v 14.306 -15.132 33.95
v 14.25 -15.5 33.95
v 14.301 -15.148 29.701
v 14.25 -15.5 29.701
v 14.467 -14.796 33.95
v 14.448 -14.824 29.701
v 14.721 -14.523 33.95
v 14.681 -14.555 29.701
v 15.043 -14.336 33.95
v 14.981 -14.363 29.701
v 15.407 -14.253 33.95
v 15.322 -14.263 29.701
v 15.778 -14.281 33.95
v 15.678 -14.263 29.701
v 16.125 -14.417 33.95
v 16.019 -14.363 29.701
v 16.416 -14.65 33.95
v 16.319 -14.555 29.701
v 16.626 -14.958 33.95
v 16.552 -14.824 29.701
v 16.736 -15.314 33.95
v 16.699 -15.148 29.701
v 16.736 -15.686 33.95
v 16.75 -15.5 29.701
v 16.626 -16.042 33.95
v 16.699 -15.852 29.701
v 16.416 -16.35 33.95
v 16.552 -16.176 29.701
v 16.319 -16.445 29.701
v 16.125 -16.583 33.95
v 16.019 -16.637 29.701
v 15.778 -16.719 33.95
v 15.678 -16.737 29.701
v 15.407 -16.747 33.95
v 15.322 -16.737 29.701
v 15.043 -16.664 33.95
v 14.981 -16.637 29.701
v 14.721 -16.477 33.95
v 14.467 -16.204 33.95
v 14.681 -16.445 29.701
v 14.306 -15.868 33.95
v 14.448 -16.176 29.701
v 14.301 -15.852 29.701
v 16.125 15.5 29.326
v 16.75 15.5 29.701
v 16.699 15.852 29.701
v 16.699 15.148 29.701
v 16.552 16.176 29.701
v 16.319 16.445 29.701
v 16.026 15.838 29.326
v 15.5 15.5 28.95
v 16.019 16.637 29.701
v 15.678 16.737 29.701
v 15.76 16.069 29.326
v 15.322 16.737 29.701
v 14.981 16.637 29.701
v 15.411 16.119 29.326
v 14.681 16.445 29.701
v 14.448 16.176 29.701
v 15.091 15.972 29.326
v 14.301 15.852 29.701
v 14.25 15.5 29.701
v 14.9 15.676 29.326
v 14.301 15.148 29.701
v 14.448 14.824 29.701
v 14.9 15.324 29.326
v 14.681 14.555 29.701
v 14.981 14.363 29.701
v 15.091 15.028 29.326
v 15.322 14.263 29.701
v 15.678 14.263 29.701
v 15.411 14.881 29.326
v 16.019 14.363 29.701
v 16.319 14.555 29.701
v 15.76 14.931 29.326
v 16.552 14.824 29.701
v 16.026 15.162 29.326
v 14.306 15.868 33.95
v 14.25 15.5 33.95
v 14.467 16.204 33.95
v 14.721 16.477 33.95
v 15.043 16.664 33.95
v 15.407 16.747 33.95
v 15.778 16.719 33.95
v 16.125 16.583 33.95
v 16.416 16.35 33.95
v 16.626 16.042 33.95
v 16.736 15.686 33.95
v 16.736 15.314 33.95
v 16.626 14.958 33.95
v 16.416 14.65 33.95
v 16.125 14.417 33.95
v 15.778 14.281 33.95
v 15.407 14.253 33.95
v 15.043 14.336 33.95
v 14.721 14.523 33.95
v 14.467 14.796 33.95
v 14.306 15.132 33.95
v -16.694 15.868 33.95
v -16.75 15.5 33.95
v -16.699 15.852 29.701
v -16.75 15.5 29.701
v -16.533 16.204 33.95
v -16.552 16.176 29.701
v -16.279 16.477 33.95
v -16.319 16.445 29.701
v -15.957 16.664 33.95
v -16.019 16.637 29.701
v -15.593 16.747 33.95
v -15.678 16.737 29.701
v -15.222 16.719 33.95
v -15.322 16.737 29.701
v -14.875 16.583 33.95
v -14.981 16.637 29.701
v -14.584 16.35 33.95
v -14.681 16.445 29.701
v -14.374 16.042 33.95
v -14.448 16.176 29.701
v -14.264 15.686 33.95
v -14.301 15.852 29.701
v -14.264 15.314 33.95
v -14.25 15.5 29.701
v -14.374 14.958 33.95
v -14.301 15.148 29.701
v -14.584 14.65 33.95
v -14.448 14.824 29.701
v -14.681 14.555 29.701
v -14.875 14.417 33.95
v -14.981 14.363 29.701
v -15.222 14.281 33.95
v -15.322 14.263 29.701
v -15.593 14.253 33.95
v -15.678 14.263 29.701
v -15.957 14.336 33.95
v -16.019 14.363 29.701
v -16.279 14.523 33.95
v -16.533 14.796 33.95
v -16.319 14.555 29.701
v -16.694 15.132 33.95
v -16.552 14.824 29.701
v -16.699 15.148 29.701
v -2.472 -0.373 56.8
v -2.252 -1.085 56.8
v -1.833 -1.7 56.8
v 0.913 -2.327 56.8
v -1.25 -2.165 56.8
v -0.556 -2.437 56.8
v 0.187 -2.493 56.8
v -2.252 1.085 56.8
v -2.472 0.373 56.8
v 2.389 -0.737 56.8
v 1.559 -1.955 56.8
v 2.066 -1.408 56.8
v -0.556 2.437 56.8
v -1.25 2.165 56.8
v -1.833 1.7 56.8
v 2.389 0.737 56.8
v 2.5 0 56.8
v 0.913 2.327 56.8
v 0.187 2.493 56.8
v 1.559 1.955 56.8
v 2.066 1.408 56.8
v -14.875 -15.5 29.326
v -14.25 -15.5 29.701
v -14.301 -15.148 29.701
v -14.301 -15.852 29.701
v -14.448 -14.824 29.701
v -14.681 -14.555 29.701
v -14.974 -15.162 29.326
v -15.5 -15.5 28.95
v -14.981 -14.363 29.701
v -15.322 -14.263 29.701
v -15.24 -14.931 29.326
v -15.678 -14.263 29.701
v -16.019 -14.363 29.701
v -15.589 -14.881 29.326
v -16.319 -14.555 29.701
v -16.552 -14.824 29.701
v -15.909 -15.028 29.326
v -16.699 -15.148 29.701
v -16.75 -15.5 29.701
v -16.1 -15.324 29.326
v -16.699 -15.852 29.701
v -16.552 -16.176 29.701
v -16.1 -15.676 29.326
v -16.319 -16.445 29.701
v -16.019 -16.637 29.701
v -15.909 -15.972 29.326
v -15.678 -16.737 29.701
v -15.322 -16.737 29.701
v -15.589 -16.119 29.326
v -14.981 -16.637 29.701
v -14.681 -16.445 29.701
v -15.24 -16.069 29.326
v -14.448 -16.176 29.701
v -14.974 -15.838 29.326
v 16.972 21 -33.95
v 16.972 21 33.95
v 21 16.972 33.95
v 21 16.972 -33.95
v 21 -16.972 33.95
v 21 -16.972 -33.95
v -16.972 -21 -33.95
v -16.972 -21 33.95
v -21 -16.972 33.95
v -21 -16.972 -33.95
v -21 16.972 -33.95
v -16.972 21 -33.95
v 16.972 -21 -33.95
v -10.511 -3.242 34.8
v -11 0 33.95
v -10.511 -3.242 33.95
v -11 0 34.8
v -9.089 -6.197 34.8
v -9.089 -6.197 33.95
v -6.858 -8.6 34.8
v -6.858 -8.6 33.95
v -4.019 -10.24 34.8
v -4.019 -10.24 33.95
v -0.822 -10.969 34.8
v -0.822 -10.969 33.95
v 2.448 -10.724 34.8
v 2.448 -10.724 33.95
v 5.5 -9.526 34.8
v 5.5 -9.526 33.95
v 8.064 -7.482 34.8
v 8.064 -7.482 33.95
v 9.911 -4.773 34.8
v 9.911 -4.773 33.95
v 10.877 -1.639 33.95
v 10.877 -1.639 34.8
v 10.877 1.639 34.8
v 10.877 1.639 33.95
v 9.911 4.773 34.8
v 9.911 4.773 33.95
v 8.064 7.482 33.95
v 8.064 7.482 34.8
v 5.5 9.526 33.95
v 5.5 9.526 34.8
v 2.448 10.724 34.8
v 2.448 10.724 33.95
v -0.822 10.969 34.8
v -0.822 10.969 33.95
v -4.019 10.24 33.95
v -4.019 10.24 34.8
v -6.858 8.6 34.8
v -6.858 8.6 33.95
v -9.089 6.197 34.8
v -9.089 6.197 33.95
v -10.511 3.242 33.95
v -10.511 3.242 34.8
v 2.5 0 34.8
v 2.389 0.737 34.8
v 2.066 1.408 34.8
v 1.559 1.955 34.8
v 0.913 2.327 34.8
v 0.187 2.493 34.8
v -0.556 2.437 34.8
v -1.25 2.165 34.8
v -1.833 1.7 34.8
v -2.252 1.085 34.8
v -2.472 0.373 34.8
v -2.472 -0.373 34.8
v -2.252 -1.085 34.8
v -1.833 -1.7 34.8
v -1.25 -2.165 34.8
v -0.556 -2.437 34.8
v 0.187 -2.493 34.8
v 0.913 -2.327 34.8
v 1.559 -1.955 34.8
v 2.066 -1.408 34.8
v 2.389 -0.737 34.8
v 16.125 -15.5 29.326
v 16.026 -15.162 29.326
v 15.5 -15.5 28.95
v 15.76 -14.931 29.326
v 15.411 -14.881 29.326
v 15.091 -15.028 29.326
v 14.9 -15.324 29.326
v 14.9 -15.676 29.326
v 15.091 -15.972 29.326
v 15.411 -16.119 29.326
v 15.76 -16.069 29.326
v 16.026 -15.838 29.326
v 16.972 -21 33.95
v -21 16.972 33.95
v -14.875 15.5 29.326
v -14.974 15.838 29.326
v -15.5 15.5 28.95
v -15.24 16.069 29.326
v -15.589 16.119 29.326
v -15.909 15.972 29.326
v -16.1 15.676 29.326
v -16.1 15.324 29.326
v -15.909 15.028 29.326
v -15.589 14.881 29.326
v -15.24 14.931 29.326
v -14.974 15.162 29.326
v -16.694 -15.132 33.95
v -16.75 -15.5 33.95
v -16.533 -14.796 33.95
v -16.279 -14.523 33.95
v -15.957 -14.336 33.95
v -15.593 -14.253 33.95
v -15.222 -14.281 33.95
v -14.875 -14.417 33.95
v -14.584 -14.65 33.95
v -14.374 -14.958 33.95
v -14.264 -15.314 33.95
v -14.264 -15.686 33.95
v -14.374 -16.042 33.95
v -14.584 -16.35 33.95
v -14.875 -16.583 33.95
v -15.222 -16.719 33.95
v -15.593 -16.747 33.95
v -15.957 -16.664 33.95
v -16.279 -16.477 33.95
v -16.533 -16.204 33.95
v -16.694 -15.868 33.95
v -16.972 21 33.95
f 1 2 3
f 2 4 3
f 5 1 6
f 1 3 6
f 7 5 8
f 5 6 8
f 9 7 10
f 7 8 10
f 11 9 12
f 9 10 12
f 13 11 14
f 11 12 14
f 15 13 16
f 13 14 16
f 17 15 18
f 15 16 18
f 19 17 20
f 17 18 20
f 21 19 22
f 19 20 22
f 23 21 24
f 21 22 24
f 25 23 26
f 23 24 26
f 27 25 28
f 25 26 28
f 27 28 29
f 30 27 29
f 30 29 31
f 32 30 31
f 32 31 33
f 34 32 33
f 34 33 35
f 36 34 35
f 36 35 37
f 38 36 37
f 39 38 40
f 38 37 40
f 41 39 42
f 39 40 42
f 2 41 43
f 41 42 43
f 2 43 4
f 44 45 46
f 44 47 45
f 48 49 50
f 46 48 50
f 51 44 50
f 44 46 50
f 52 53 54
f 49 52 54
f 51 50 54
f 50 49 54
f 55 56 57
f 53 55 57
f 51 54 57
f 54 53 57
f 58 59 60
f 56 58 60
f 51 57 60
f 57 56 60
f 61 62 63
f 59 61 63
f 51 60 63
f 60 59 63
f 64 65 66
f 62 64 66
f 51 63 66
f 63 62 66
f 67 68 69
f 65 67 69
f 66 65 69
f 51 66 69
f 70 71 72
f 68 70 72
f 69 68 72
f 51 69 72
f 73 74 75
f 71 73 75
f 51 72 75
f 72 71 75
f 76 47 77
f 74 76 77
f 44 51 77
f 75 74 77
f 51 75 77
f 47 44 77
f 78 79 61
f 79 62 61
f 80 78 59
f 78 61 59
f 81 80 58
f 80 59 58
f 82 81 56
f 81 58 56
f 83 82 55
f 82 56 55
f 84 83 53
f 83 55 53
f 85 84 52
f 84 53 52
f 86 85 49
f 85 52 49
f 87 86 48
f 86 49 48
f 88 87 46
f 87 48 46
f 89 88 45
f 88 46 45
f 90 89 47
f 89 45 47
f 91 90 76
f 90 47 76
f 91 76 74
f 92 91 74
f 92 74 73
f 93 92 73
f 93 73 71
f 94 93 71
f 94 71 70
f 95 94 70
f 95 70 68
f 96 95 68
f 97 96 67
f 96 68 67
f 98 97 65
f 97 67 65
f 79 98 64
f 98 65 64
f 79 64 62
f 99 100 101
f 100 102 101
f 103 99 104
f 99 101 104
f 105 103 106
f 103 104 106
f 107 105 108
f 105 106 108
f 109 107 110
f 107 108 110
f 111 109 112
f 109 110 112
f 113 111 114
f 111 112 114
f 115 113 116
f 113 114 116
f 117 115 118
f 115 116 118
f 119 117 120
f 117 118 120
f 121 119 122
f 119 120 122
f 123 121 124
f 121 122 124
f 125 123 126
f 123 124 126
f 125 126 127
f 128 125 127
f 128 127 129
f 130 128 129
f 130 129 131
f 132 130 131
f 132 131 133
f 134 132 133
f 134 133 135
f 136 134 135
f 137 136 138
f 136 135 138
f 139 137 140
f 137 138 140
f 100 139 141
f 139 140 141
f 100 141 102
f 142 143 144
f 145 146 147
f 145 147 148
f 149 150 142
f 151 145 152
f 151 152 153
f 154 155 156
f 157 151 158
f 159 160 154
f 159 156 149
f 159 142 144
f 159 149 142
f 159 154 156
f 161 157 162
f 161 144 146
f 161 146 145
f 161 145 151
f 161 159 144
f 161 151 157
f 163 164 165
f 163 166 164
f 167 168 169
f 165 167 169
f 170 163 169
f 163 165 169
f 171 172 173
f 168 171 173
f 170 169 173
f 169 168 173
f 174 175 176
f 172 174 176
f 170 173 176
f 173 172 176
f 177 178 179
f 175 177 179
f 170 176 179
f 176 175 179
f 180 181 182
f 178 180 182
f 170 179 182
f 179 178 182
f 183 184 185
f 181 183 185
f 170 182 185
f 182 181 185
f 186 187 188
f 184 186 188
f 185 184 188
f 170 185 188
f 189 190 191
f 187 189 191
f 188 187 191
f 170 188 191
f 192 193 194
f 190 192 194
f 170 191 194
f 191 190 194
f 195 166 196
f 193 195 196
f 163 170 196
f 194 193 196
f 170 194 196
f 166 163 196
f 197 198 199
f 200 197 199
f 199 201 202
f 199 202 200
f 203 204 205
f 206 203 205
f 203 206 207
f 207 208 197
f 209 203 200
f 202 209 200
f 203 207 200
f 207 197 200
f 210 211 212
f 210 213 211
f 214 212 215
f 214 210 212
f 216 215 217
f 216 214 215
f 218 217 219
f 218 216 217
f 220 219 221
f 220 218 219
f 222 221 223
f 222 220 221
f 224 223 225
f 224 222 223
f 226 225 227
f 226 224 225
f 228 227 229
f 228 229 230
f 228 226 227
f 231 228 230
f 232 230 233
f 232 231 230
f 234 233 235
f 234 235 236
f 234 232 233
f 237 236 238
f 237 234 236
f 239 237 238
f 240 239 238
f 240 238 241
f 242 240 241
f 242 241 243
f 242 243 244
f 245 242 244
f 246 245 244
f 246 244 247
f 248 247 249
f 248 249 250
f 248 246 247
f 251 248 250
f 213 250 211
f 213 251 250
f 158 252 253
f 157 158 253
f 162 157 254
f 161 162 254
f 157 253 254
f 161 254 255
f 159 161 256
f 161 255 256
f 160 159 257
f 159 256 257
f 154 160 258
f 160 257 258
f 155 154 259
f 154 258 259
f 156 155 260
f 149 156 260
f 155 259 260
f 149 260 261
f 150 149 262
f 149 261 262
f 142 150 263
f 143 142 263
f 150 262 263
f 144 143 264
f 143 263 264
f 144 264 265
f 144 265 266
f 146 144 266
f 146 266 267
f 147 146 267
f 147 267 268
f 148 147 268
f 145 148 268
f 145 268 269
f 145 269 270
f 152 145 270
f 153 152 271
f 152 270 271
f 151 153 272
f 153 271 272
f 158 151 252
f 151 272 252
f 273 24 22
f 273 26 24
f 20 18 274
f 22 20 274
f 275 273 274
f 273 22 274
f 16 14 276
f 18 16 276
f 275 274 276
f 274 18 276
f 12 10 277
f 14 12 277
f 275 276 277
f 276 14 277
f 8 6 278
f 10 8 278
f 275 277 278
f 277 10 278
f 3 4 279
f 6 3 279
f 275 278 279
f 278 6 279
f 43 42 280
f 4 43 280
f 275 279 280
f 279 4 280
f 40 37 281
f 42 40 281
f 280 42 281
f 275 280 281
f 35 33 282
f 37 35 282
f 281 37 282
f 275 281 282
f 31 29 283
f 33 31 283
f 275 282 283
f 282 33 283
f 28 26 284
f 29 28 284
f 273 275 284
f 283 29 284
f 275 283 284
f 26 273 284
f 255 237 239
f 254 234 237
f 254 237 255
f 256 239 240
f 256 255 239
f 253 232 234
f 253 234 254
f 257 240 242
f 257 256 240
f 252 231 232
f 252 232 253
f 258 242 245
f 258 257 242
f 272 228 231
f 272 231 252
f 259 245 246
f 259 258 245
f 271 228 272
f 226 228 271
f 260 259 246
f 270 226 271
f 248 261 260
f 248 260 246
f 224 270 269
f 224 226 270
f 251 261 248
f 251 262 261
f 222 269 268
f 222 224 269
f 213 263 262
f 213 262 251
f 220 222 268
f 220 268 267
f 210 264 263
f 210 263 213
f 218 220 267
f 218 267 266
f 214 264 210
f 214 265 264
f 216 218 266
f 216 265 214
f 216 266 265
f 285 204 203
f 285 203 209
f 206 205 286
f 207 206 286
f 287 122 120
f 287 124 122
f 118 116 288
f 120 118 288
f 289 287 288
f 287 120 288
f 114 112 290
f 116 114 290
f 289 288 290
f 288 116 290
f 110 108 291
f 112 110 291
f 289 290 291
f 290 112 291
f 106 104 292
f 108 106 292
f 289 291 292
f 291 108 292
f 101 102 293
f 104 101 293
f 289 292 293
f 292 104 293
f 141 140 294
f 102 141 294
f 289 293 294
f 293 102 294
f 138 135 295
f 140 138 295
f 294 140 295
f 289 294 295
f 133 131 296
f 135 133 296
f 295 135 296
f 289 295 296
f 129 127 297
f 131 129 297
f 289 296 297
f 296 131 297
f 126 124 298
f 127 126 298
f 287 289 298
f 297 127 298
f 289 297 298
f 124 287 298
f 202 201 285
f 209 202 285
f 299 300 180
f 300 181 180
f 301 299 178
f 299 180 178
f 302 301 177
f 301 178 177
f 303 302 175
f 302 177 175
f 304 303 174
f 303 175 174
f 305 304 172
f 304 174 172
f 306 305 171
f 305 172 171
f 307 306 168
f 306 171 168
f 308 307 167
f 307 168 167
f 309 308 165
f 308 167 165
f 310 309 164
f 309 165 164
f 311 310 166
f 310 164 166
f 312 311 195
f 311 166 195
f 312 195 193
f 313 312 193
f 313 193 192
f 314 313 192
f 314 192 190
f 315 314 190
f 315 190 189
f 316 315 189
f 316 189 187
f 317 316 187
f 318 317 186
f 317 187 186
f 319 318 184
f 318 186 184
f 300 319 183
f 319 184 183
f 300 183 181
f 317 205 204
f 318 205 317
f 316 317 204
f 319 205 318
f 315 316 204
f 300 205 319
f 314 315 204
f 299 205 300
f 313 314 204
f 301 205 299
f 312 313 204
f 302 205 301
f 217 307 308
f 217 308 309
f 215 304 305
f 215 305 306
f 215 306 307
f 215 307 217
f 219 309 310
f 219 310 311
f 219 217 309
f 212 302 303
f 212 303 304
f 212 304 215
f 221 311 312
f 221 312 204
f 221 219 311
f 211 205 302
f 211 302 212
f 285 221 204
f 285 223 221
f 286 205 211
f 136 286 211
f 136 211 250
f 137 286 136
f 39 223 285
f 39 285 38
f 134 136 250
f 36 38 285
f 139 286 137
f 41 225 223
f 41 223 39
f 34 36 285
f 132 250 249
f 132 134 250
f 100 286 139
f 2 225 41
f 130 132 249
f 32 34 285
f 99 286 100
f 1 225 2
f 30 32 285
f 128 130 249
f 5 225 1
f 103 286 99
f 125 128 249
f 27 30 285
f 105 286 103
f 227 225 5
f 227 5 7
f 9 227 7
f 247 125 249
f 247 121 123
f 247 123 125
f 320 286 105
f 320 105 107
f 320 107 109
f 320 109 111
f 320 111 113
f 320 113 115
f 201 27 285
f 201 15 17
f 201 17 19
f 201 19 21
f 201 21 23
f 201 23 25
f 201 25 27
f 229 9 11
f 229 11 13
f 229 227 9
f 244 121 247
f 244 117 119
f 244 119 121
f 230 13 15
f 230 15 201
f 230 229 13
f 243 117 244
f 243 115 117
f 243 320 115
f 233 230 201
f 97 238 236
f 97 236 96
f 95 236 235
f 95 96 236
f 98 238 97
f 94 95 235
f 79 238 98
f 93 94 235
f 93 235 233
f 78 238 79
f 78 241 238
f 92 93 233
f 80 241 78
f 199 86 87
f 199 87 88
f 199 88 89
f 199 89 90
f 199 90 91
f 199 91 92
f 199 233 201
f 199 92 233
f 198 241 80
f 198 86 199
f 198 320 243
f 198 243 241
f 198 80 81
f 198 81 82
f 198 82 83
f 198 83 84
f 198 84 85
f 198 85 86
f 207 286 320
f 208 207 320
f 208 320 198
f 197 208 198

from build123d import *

# Parameters (mm, degrees)
SKETCH1_W               = 42
SKETCH1_H               = 42
BOSS_EXTRUDE1_DEPTH     = 33.95
SKETCH2_R               = 11
BOSS_EXTRUDE2_DEPTH     = 0.85
SKETCH3_R               = 2.5
BOSS_EXTRUDE3_DEPTH     = 22
CUT_EXTRUDE_THIN1_DEPTH = 75.110795435
M3_TAPPED_HOLE1_D       = 2.5
M3_TAPPED_HOLE1_DEPTH   = 4.248924226
M3_TAPPED_HOLE1_TIP     = 0.751075774


with BuildPart() as part:
    # Sketch1 → Boss-Extrude1 (new, symmetric)
    with BuildSketch(Plane.XY):
        Rectangle(SKETCH1_W, SKETCH1_H)
    extrude(amount=BOSS_EXTRUDE1_DEPTH, both=True)

    # Sketch2 → Boss-Extrude2 (add, symmetric)
    with BuildSketch(Plane.XY.offset(33.95)):
        with Locations(Location((0, 0, 0), (0, 0, 180))):
            Circle(SKETCH2_R)
    extrude(amount=BOSS_EXTRUDE2_DEPTH, both=True)

    # Sketch3 → Boss-Extrude3 (add)
    with BuildSketch(Plane.XY.offset(34.8)):
        Circle(SKETCH3_R)
    extrude(amount=BOSS_EXTRUDE3_DEPTH)

    # Sketch4 → Cut-Extrude-Thin1 (cut, through all)
    with BuildSketch(Plane.XY.offset(33.95)):
        Polygon((0, 52.113769773), (52.113769773, 0), (0, -52.113769773), (-52.113769773, 0), align=None)
        Polygon((0, 37.97163415), (37.97163415, 0), (0, -37.97163415), (-37.97163415, 0), align=None, mode=Mode.SUBTRACT)
    extrude(amount=-CUT_EXTRUDE_THIN1_DEPTH, mode=Mode.SUBTRACT)

    # M3 Tapped Hole1
    with Locations(Plane.XY.offset(33.95)):
        with Locations((-15.5, 15.5), (15.5, -15.5), (15.5, 15.5), (-15.5, -15.5)):
            Hole(M3_TAPPED_HOLE1_D / 2, depth=M3_TAPPED_HOLE1_DEPTH)
            with Locations((0, 0, -(M3_TAPPED_HOLE1_DEPTH + M3_TAPPED_HOLE1_TIP / 2))):  # 118° drill point
                Cone(0, M3_TAPPED_HOLE1_D / 2, M3_TAPPED_HOLE1_TIP, mode=Mode.SUBTRACT)


solid = part.part
